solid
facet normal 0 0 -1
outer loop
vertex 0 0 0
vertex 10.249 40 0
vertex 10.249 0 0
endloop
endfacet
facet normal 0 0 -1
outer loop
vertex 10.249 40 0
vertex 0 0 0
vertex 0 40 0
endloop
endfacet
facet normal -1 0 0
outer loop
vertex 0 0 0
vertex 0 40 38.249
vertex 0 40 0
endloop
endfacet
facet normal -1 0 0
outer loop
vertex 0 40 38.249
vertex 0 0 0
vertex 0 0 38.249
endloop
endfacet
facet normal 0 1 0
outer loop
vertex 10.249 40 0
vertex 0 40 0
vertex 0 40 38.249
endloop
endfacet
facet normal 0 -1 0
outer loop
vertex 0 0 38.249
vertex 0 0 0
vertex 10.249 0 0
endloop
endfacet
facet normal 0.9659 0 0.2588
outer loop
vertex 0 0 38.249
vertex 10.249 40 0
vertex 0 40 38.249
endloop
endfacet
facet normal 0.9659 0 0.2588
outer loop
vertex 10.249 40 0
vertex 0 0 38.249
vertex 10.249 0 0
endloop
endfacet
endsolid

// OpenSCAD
difference() {
	cube([40, 40, 40]);
	translate([14, 0, -14])
		rotate([0, -15, 0])
			cube([400, 400, 400]);
}
